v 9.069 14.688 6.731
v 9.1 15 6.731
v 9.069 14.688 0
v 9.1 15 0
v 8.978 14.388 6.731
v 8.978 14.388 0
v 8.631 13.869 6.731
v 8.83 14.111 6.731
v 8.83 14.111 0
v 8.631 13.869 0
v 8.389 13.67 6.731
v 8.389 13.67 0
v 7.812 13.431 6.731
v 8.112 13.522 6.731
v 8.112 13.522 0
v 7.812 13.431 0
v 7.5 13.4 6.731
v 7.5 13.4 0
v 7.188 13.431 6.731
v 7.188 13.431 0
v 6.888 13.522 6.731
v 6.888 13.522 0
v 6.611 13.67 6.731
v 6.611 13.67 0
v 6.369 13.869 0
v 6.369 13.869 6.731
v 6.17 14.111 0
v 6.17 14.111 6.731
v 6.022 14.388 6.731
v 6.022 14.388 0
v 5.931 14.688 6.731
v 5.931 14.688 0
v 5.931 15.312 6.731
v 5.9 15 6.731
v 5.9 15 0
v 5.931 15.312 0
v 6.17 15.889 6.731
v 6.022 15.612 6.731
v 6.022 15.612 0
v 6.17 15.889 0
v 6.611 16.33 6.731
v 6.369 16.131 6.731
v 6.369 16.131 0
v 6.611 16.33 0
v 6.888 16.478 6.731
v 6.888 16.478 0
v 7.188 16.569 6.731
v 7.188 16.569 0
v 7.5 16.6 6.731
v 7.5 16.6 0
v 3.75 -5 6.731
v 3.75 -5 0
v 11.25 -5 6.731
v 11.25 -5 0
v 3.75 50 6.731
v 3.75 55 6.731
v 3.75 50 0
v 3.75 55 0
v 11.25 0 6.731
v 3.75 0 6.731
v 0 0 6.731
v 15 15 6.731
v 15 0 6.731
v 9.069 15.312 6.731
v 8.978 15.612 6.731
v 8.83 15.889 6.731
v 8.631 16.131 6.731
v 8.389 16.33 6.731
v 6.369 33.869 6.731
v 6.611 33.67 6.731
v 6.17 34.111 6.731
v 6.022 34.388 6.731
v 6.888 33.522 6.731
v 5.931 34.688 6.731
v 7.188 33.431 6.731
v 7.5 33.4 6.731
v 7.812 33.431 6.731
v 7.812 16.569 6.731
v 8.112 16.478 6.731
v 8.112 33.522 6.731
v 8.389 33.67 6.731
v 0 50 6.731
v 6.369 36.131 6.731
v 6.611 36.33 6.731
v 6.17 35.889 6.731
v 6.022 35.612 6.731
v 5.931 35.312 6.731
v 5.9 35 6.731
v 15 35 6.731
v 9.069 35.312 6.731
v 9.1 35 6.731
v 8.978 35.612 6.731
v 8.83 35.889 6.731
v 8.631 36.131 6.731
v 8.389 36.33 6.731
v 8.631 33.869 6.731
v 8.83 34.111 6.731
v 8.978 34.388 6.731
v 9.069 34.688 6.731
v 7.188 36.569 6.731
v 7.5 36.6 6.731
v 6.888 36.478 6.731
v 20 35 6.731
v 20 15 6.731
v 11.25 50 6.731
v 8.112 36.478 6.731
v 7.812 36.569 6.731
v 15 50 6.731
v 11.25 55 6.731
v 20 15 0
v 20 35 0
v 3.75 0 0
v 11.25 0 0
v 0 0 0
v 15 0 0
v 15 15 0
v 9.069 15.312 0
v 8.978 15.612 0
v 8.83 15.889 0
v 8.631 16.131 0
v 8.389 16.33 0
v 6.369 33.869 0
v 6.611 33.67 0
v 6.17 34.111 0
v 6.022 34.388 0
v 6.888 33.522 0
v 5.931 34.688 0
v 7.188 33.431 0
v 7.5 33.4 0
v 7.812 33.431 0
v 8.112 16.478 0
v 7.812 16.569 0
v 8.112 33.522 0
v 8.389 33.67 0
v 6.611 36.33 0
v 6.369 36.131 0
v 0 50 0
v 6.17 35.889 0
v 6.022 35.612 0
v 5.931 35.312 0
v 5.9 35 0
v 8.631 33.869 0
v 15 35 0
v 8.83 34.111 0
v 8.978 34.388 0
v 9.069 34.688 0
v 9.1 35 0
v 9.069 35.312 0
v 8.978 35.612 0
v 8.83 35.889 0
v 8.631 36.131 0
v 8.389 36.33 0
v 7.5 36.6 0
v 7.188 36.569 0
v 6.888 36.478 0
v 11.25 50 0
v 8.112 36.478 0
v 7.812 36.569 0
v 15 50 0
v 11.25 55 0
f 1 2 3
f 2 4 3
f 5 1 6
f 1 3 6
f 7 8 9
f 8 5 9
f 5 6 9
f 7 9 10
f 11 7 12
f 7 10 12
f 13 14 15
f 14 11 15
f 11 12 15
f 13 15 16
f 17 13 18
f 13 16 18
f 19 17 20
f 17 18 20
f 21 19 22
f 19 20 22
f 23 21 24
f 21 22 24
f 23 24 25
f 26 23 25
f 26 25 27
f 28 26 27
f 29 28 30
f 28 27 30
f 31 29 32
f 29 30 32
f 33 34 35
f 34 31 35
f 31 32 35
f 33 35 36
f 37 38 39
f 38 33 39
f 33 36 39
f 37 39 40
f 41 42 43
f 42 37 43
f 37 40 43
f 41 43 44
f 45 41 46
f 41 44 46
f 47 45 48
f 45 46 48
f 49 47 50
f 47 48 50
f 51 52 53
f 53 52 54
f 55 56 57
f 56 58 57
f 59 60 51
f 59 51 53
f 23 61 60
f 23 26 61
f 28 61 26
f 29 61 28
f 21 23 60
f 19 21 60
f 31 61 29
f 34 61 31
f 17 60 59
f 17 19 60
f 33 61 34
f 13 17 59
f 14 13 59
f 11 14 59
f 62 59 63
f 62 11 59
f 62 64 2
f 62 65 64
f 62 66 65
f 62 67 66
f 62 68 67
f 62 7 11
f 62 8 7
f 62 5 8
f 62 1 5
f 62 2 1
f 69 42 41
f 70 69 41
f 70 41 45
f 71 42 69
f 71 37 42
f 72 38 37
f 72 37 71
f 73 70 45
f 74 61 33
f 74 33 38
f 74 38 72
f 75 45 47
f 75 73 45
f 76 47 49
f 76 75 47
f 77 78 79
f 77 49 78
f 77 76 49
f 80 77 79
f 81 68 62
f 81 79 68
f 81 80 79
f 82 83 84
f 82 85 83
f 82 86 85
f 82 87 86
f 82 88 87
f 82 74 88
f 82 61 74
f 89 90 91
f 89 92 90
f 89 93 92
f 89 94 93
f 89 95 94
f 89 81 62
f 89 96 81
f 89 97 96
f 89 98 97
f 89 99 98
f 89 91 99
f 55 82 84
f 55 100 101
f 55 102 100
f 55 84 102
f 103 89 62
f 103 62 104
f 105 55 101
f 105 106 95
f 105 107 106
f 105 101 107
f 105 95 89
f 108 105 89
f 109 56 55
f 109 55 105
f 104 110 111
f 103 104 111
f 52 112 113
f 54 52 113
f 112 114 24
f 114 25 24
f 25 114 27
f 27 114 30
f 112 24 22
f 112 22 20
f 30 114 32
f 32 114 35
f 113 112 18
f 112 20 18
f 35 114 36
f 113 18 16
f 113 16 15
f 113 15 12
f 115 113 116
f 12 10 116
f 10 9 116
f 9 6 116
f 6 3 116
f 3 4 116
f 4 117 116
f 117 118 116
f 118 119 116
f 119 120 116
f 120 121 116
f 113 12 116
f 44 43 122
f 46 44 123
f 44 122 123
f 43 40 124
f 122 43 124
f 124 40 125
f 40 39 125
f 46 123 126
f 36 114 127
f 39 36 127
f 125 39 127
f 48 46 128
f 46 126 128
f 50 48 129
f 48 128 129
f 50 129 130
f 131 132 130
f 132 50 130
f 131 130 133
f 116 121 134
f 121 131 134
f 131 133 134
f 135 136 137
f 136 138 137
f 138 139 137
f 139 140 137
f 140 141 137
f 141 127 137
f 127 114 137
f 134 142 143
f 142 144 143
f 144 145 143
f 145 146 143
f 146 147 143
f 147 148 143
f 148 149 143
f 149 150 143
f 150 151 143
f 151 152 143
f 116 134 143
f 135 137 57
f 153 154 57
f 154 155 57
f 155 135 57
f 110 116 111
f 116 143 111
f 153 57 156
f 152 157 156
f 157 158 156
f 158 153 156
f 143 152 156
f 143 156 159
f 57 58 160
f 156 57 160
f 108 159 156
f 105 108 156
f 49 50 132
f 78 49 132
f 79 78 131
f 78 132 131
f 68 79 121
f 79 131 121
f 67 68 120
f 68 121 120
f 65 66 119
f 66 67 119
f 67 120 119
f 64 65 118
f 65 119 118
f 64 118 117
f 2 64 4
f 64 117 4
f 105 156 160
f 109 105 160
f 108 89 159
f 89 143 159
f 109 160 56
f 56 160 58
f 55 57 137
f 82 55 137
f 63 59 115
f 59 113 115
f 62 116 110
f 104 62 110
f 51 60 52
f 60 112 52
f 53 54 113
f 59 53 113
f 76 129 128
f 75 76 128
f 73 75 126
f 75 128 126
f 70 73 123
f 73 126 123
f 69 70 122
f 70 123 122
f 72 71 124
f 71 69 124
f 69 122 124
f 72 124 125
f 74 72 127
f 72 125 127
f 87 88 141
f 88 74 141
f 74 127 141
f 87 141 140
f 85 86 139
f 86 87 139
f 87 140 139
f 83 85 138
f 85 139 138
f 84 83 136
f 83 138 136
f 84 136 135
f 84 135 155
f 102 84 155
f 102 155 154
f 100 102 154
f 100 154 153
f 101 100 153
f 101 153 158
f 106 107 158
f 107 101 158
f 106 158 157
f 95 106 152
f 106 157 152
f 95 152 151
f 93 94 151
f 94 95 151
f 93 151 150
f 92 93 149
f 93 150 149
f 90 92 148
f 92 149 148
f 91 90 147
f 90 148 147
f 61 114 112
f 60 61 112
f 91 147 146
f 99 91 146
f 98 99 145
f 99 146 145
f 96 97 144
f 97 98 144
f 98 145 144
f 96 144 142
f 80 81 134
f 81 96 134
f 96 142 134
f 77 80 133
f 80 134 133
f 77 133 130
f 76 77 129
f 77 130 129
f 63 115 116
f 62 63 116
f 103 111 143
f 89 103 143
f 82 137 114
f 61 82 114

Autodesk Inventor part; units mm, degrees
ref_plane "YZ Plane" through (0, 0, 0) normal (1, 0, 0) x (0, 1, 0)
ref_plane "XZ Plane" through (0, 0, 0) normal (0, 1, 0) x (-1, 0, 0)
ref_plane "XY Plane" through (0, 0, 0) normal (0, 0, 1) x (1, 0, 0)
sketch "Sketch1" plane through (0, 0, 0) normal (0, 0, 1) x (1, 0, 0)
  line L0 (0, 0) -> (3.75, 0)
  line L1 (3.75, 0) -> (3.75, -5)
  line L2 (3.75, -5) -> (11.25, -5)
  line L3 (11.25, -5) -> (11.25, 0)
  line L4 (11.25, 0) -> (15, 0)
  line L5 (15, 0) -> (15, 15)
  line L6 (15, 15) -> (20, 15)
  line L7 (20, 15) -> (20, 35)
  line L8 (20, 35) -> (15, 35)
  line L9 (15, 35) -> (15, 50)
  line L10 (15, 50) -> (11.25, 50)
  line L11 (11.25, 50) -> (11.25, 55)
  line L12 (11.25, 55) -> (3.75, 55)
  line L13 (3.75, 55) -> (3.75, 50)
  line L14 (3.75, 50) -> (0, 50)
  line L15 (0, 50) -> (0, 0)
  circle A0 centre (7.5, 35) radius 1.6
  circle A1 centre (7.5, 15) radius 1.6
  line L16 (7.5, 15) -> (7.5, 35)
  point P0 (20, 25)
  point P1 (0, 25)
  point P2 (7.5, -5)
  point P3 (7.5, 25)
  dimension "d0" = 5
  dimension "d1" = 50
  dimension "d2" = 20
  dimension "d3" = 7.5
  dimension "d4" = 15
  dimension "d5" = 3.2
  dimension "d6" = 20
extrude "Extrusion1" add sketch "Sketch1" along normal blind 6.731
equation "\"d7\" = THICKB"
equation "\"THICKA\" = 3.175"
equation "\"THICKB\" = 6.731"
equation "\"THICKC\" = 12.7"
equation "\"BALLDIA\" = 12"
equation "\"MAGDIA\" = 9.5"
equation "\"THICKPLY\" = 5"
properties part number "Frame_Lower_Vertical_Plate_B"
